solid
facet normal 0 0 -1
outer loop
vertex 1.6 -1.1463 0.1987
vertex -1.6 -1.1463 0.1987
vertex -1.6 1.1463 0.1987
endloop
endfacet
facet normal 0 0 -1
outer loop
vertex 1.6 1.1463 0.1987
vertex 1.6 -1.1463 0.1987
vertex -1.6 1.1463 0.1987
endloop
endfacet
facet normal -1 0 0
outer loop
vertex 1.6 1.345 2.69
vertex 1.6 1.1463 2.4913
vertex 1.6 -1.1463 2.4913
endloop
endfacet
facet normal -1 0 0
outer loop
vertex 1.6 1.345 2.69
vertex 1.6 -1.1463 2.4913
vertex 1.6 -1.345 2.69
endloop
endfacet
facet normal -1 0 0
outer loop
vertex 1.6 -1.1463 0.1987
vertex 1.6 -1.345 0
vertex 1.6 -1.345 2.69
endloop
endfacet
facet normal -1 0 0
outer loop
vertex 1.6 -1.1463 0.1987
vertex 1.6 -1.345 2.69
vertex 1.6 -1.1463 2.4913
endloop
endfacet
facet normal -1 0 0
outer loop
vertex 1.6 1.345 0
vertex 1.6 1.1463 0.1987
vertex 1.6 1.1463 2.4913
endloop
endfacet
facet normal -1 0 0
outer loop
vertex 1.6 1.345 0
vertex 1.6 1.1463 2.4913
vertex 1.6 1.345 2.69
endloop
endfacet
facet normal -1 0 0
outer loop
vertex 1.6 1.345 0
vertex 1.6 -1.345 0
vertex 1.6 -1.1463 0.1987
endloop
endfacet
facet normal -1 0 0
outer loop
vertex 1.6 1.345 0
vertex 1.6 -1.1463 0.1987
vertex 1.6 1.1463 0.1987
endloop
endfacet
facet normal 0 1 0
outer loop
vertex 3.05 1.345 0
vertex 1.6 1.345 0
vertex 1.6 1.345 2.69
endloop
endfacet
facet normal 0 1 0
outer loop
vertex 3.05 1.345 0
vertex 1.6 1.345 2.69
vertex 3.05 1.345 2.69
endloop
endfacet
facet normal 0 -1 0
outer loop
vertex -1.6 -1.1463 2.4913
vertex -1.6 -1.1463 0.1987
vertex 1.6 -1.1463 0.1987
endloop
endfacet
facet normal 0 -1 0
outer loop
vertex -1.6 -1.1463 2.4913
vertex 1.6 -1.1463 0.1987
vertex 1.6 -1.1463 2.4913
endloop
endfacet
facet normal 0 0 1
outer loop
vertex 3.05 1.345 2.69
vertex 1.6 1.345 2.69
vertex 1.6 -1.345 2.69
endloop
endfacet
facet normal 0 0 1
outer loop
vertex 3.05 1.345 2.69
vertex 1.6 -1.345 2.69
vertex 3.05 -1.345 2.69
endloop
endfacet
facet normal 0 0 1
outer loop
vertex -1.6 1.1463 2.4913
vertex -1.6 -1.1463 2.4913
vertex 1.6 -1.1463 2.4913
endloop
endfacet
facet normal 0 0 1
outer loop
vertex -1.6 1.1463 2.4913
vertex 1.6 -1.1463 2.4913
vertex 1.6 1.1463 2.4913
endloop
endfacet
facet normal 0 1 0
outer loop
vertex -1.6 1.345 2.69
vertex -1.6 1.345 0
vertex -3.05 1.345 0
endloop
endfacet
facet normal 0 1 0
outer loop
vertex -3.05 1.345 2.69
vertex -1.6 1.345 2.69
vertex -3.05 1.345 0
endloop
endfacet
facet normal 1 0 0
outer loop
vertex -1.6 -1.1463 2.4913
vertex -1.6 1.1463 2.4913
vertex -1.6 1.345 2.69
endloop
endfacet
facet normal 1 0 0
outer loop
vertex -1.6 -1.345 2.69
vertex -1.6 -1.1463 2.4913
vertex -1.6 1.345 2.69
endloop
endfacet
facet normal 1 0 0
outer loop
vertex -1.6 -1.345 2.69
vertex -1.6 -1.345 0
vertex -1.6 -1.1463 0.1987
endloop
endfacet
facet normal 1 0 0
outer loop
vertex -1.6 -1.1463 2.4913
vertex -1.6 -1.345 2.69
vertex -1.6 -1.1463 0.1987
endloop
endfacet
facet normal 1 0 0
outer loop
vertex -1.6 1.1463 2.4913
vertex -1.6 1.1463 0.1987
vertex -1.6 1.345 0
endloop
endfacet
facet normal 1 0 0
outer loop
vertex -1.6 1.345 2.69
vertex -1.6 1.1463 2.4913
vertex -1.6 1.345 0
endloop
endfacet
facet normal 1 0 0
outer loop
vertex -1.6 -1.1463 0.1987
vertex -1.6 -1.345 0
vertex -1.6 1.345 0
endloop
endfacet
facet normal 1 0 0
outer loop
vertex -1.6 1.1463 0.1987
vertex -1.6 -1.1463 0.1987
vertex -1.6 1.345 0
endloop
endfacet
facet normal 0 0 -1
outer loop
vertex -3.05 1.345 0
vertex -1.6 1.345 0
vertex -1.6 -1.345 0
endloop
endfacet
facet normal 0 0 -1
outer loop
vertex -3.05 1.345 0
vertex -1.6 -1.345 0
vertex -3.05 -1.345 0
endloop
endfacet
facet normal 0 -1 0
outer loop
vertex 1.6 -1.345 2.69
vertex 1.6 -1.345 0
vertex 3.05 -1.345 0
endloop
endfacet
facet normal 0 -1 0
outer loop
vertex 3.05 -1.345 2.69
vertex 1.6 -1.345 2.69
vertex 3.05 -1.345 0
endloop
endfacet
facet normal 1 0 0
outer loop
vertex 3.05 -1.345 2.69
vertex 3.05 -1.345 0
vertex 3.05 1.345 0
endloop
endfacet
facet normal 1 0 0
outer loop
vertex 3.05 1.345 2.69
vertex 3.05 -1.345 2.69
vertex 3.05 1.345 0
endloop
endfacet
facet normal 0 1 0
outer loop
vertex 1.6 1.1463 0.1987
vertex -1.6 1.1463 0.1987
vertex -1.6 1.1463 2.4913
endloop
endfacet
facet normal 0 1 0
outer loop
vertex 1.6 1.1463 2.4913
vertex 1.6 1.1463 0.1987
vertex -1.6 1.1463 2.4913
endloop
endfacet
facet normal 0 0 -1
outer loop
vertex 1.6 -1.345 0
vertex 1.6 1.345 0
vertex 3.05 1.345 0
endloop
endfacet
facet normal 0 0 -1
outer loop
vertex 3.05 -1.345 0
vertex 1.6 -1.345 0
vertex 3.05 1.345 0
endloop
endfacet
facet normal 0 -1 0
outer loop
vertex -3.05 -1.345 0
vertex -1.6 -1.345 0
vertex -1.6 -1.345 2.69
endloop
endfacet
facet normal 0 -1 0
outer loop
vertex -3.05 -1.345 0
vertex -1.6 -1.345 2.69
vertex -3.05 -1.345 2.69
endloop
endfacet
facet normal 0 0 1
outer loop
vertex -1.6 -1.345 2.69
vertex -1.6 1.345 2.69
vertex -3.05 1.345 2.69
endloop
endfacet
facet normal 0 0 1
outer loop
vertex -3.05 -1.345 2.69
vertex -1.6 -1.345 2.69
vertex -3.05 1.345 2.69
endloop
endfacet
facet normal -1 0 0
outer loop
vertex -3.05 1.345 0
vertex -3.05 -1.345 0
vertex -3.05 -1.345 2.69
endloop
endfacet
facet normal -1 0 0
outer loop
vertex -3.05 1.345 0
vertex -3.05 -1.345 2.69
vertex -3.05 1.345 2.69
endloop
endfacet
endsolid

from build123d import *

# Parameters (mm, degrees)
SKETCH_1_W      = 1.45
SKETCH_1_H      = 2.69
EXTRUDE_1_DEPTH = 2.69
SKETCH_2_W      = 2.292603852
SKETCH_2_H      = 2.292603852
EXTRUDE_2_DEPTH = 1.6


with BuildPart() as part:
    # Эскиз1 → Бобышка-Вытянуть1 (new body)
    with BuildSketch(Plane.XY):
        with Locations((2.325, 0)):
            Rectangle(SKETCH_1_W, SKETCH_1_H)
    extrude(amount=EXTRUDE_1_DEPTH)

    # Эскиз2 → Бобышка-Вытянуть2 (add)
    with BuildSketch(Plane.ZY.offset(-1.6)):
        with Locations((1.345, 0)):
            Rectangle(SKETCH_2_W, SKETCH_2_H)
    extrude(amount=EXTRUDE_2_DEPTH)

    # Зеркальное отражение1: part across plane


with BuildPart() as part_1:
    add(part.part)
    add(part.part.mirror(Plane(origin=(0, 0, 0), x_dir=(0, 0, 1), z_dir=(1, 0, 0))))


solid = part_1.part
